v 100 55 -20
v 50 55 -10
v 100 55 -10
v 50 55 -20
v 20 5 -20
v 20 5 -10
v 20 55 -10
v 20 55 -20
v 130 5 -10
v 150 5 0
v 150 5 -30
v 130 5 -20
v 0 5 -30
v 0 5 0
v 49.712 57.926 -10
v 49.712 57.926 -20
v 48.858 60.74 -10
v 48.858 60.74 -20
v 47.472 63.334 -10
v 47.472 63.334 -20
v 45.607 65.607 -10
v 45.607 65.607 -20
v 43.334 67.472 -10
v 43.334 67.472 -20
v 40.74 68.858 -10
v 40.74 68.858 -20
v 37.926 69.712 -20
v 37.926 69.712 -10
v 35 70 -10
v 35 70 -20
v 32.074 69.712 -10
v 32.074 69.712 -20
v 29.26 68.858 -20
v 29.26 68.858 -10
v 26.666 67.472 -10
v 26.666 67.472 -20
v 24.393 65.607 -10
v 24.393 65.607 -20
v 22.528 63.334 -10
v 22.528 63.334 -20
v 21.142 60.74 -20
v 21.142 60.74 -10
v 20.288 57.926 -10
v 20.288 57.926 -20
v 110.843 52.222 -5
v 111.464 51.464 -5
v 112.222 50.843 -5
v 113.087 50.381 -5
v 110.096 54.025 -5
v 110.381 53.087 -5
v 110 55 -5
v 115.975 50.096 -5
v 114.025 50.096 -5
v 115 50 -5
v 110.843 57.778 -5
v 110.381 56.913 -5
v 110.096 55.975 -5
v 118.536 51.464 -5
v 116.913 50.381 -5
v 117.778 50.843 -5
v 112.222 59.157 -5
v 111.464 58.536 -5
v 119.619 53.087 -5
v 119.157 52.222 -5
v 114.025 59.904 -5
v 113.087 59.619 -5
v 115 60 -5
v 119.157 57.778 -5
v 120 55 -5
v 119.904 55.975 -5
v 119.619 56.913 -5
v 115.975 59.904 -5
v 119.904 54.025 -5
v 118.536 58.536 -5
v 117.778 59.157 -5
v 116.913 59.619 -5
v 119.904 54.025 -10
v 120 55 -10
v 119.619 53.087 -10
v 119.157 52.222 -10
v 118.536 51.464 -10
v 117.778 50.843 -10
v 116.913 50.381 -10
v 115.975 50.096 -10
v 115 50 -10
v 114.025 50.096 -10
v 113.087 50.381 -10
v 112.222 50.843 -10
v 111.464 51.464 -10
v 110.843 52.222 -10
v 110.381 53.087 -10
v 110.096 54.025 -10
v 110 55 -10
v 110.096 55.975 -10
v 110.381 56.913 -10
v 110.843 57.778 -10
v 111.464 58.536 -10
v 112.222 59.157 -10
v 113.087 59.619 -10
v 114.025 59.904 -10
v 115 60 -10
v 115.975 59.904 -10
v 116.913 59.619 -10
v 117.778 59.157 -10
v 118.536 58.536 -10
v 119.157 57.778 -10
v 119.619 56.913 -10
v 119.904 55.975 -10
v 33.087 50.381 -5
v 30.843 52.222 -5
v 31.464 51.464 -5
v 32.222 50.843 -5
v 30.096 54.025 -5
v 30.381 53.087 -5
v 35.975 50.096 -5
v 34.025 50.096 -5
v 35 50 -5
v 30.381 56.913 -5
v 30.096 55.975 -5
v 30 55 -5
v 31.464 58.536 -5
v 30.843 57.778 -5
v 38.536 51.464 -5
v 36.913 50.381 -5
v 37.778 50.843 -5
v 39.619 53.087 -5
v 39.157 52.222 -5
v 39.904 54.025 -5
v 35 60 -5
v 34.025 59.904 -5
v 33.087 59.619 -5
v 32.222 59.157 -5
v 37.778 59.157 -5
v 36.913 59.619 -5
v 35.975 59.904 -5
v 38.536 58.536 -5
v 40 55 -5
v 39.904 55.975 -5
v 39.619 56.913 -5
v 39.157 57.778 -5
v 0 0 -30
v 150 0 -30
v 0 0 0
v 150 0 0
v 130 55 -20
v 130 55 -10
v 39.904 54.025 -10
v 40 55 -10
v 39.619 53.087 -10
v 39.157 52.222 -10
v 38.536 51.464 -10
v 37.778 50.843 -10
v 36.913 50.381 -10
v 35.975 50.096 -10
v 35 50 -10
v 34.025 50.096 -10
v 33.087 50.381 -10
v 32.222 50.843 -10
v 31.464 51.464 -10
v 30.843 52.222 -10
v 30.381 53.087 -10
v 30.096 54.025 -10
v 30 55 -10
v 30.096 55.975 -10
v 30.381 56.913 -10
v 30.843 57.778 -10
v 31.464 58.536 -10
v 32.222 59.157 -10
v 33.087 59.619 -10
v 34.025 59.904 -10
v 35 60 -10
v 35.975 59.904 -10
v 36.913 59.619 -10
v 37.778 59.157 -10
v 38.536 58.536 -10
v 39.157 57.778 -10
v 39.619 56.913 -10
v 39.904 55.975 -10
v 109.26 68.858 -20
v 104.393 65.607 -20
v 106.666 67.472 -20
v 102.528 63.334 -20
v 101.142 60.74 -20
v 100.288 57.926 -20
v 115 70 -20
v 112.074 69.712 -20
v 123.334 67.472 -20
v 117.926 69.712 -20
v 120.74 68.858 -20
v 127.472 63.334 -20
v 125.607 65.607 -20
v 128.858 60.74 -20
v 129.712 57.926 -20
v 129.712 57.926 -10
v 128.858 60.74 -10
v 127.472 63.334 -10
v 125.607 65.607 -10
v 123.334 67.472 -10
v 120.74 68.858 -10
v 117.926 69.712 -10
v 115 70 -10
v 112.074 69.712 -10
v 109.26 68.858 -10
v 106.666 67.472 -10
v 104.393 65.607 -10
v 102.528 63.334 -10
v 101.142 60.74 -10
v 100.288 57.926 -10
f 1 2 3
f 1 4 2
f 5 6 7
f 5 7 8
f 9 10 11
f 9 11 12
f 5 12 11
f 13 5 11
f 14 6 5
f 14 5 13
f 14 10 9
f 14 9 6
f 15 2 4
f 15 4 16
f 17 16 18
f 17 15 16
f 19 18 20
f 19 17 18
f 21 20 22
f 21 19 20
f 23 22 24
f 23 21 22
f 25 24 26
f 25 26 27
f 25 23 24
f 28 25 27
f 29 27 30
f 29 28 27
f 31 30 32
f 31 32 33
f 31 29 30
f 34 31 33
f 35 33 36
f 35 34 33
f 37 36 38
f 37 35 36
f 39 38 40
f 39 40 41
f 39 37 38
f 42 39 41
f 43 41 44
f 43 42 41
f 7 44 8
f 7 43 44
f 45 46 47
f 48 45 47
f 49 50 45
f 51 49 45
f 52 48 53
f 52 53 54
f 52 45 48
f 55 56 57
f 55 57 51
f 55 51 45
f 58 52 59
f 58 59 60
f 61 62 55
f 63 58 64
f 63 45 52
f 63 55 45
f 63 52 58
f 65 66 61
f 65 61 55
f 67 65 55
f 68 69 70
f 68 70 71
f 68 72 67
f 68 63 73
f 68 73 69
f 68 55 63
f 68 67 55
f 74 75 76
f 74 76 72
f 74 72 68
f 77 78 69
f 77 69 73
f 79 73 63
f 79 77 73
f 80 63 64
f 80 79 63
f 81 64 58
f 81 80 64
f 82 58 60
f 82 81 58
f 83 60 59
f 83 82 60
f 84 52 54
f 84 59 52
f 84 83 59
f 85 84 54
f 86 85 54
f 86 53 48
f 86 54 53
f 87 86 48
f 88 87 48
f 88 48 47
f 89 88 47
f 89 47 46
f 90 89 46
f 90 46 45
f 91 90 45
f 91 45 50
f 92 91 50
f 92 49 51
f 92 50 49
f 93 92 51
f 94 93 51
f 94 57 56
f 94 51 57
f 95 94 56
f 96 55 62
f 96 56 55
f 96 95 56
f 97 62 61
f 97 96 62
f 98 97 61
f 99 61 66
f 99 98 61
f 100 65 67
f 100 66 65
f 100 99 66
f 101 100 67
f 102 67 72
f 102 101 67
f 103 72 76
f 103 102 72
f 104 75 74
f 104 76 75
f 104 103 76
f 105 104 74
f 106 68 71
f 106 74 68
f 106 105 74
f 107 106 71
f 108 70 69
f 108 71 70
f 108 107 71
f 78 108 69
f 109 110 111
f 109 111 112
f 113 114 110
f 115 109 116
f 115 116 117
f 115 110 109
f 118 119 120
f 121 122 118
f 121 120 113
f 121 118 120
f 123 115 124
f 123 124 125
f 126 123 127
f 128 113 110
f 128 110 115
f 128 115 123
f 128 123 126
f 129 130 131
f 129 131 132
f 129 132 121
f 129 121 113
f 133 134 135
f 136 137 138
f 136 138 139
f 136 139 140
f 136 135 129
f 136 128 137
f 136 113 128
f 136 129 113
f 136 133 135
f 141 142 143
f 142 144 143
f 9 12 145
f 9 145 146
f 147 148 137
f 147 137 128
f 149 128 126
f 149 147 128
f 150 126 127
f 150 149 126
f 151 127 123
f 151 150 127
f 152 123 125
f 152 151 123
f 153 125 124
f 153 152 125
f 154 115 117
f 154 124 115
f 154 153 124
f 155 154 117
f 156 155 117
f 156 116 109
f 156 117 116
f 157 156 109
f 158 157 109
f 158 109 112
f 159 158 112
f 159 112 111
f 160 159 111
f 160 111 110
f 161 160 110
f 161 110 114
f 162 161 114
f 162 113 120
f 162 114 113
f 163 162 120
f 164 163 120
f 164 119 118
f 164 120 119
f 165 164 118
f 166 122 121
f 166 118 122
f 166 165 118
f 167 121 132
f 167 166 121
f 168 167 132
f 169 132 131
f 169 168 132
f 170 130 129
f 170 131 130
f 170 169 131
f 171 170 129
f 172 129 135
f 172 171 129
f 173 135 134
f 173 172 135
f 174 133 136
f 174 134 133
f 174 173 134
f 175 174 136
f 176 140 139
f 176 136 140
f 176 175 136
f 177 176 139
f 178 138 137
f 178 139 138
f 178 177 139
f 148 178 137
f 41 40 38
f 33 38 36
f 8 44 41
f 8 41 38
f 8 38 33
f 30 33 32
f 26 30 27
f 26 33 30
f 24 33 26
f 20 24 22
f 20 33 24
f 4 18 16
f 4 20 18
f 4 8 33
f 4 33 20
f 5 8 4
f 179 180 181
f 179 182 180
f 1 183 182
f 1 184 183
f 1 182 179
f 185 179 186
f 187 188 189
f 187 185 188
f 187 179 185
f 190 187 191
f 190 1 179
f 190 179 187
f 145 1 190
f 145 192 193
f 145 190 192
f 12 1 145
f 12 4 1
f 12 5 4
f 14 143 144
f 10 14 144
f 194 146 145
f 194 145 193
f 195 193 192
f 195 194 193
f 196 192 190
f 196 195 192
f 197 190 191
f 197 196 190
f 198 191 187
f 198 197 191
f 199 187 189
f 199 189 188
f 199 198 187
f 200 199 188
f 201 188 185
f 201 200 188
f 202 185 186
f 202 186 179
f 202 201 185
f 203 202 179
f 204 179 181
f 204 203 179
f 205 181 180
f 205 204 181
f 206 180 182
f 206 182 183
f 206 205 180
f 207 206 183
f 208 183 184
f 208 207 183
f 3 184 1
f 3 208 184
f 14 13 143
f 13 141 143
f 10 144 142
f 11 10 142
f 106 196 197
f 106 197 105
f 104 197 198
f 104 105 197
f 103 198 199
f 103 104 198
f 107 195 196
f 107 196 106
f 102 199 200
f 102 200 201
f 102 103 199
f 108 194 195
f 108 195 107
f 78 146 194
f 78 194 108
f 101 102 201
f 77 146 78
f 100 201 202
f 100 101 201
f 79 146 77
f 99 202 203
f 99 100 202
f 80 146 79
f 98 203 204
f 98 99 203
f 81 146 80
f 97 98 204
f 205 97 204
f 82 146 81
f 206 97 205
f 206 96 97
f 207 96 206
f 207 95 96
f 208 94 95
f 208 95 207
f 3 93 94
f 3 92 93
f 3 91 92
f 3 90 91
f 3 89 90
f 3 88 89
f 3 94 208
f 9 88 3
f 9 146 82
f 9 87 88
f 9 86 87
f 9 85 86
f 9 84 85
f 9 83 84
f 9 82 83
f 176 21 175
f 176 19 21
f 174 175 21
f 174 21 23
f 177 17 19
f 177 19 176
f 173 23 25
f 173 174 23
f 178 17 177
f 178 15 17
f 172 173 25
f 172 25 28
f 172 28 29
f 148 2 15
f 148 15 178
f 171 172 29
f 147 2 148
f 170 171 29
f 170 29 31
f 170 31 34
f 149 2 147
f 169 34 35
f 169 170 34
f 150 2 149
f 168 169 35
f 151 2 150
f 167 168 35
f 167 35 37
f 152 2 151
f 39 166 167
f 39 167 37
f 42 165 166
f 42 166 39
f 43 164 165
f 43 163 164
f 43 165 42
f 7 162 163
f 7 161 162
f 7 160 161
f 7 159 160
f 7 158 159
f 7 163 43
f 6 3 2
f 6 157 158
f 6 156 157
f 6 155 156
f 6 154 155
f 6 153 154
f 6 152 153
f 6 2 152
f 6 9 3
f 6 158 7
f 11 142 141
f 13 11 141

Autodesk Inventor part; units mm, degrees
ref_plane "YZ Plane" through (0, 0, 0) normal (1, 0, 0) x (0, 1, 0)
ref_plane "XZ Plane" through (0, 0, 0) normal (0, 1, 0) x (-1, 0, 0)
ref_plane "XY Plane" through (0, 0, 0) normal (0, 0, 1) x (1, 0, 0)
sketch "Эскиз1" plane through (0, 0, 0) normal (0, 1, 0) x (-1, 0, 0)
  line L0 (0, 0) -> (-150, 0)
  line L1 (-150, 0) -> (-150, -30)
  line L2 (-150, -30) -> (0, -30)
  line L3 (0, -30) -> (0, 0)
  dimension "d0" = 150
  dimension "d1" = 30
extrude "Выдавливание1" add sketch "Эскиз1" along normal blind 5
sketch "Эскиз3" plane through (0, 5, 0) normal (0, 1, 0) x (1, 0, 0)
  line L0 (20, 20) -> (130, 20)
  line L1 (130, 20) -> (130, 10)
  line L2 (130, 10) -> (20, 10)
  line L3 (20, 10) -> (20, 20)
  line L4 (150, 30) -> (0, 30) projected
  line L5 (0, 0) -> (150, 0) projected
  line L6 (0, 30) -> (0, 0) projected
  line L7 (150, 0) -> (150, 30) projected
  dimension "d8" = 10
  dimension "d9" = 10
  dimension "d10" = 20
  dimension "d11" = 20
extrude "Выдавливание3" add sketch "Эскиз3" along normal blind 50 contours L0 L1 L2 L3
sketch "Эскиз4" plane through (20, 5, -10) normal (0, 0, 1) x (1, 0, 0)
  arc A0 (30, 50) -> (0, 50) centre (15, 50) ccw
  line L0 (0, 50) -> (110, 50) projected
  line L1 (0, 0) -> (0, 50) projected
  line L2 (55, 50) -> (55, 234.7508)
  arc A1 (110, 50) -> (80, 50) centre (95, 50) ccw
  point P0 (-20, -5)
  dimension "d14" = 30
extrude "Выдавливание4" add sketch "Эскиз4" against normal up to surface (10 mm away)
sketch "Эскиз5" plane through (20, 5, -10) normal (0, 0, 1) x (1, 0, 0)
  arc A0 (30, 50) -> (0, 50) centre (15, 50) ccw projected
  arc A1 (110, 50) -> (80, 50) centre (95, 50) ccw projected
  circle A2 centre (15, 50) radius 5
  circle A3 centre (95, 50) radius 5
  point P0 (-20, -5)
  point P1 (55, 199.7494)
  dimension "d24" = 10
  dimension "d25" = 10
extrude "Выдавливание5" add sketch "Эскиз5" along normal blind 5
properties part number "Base"
